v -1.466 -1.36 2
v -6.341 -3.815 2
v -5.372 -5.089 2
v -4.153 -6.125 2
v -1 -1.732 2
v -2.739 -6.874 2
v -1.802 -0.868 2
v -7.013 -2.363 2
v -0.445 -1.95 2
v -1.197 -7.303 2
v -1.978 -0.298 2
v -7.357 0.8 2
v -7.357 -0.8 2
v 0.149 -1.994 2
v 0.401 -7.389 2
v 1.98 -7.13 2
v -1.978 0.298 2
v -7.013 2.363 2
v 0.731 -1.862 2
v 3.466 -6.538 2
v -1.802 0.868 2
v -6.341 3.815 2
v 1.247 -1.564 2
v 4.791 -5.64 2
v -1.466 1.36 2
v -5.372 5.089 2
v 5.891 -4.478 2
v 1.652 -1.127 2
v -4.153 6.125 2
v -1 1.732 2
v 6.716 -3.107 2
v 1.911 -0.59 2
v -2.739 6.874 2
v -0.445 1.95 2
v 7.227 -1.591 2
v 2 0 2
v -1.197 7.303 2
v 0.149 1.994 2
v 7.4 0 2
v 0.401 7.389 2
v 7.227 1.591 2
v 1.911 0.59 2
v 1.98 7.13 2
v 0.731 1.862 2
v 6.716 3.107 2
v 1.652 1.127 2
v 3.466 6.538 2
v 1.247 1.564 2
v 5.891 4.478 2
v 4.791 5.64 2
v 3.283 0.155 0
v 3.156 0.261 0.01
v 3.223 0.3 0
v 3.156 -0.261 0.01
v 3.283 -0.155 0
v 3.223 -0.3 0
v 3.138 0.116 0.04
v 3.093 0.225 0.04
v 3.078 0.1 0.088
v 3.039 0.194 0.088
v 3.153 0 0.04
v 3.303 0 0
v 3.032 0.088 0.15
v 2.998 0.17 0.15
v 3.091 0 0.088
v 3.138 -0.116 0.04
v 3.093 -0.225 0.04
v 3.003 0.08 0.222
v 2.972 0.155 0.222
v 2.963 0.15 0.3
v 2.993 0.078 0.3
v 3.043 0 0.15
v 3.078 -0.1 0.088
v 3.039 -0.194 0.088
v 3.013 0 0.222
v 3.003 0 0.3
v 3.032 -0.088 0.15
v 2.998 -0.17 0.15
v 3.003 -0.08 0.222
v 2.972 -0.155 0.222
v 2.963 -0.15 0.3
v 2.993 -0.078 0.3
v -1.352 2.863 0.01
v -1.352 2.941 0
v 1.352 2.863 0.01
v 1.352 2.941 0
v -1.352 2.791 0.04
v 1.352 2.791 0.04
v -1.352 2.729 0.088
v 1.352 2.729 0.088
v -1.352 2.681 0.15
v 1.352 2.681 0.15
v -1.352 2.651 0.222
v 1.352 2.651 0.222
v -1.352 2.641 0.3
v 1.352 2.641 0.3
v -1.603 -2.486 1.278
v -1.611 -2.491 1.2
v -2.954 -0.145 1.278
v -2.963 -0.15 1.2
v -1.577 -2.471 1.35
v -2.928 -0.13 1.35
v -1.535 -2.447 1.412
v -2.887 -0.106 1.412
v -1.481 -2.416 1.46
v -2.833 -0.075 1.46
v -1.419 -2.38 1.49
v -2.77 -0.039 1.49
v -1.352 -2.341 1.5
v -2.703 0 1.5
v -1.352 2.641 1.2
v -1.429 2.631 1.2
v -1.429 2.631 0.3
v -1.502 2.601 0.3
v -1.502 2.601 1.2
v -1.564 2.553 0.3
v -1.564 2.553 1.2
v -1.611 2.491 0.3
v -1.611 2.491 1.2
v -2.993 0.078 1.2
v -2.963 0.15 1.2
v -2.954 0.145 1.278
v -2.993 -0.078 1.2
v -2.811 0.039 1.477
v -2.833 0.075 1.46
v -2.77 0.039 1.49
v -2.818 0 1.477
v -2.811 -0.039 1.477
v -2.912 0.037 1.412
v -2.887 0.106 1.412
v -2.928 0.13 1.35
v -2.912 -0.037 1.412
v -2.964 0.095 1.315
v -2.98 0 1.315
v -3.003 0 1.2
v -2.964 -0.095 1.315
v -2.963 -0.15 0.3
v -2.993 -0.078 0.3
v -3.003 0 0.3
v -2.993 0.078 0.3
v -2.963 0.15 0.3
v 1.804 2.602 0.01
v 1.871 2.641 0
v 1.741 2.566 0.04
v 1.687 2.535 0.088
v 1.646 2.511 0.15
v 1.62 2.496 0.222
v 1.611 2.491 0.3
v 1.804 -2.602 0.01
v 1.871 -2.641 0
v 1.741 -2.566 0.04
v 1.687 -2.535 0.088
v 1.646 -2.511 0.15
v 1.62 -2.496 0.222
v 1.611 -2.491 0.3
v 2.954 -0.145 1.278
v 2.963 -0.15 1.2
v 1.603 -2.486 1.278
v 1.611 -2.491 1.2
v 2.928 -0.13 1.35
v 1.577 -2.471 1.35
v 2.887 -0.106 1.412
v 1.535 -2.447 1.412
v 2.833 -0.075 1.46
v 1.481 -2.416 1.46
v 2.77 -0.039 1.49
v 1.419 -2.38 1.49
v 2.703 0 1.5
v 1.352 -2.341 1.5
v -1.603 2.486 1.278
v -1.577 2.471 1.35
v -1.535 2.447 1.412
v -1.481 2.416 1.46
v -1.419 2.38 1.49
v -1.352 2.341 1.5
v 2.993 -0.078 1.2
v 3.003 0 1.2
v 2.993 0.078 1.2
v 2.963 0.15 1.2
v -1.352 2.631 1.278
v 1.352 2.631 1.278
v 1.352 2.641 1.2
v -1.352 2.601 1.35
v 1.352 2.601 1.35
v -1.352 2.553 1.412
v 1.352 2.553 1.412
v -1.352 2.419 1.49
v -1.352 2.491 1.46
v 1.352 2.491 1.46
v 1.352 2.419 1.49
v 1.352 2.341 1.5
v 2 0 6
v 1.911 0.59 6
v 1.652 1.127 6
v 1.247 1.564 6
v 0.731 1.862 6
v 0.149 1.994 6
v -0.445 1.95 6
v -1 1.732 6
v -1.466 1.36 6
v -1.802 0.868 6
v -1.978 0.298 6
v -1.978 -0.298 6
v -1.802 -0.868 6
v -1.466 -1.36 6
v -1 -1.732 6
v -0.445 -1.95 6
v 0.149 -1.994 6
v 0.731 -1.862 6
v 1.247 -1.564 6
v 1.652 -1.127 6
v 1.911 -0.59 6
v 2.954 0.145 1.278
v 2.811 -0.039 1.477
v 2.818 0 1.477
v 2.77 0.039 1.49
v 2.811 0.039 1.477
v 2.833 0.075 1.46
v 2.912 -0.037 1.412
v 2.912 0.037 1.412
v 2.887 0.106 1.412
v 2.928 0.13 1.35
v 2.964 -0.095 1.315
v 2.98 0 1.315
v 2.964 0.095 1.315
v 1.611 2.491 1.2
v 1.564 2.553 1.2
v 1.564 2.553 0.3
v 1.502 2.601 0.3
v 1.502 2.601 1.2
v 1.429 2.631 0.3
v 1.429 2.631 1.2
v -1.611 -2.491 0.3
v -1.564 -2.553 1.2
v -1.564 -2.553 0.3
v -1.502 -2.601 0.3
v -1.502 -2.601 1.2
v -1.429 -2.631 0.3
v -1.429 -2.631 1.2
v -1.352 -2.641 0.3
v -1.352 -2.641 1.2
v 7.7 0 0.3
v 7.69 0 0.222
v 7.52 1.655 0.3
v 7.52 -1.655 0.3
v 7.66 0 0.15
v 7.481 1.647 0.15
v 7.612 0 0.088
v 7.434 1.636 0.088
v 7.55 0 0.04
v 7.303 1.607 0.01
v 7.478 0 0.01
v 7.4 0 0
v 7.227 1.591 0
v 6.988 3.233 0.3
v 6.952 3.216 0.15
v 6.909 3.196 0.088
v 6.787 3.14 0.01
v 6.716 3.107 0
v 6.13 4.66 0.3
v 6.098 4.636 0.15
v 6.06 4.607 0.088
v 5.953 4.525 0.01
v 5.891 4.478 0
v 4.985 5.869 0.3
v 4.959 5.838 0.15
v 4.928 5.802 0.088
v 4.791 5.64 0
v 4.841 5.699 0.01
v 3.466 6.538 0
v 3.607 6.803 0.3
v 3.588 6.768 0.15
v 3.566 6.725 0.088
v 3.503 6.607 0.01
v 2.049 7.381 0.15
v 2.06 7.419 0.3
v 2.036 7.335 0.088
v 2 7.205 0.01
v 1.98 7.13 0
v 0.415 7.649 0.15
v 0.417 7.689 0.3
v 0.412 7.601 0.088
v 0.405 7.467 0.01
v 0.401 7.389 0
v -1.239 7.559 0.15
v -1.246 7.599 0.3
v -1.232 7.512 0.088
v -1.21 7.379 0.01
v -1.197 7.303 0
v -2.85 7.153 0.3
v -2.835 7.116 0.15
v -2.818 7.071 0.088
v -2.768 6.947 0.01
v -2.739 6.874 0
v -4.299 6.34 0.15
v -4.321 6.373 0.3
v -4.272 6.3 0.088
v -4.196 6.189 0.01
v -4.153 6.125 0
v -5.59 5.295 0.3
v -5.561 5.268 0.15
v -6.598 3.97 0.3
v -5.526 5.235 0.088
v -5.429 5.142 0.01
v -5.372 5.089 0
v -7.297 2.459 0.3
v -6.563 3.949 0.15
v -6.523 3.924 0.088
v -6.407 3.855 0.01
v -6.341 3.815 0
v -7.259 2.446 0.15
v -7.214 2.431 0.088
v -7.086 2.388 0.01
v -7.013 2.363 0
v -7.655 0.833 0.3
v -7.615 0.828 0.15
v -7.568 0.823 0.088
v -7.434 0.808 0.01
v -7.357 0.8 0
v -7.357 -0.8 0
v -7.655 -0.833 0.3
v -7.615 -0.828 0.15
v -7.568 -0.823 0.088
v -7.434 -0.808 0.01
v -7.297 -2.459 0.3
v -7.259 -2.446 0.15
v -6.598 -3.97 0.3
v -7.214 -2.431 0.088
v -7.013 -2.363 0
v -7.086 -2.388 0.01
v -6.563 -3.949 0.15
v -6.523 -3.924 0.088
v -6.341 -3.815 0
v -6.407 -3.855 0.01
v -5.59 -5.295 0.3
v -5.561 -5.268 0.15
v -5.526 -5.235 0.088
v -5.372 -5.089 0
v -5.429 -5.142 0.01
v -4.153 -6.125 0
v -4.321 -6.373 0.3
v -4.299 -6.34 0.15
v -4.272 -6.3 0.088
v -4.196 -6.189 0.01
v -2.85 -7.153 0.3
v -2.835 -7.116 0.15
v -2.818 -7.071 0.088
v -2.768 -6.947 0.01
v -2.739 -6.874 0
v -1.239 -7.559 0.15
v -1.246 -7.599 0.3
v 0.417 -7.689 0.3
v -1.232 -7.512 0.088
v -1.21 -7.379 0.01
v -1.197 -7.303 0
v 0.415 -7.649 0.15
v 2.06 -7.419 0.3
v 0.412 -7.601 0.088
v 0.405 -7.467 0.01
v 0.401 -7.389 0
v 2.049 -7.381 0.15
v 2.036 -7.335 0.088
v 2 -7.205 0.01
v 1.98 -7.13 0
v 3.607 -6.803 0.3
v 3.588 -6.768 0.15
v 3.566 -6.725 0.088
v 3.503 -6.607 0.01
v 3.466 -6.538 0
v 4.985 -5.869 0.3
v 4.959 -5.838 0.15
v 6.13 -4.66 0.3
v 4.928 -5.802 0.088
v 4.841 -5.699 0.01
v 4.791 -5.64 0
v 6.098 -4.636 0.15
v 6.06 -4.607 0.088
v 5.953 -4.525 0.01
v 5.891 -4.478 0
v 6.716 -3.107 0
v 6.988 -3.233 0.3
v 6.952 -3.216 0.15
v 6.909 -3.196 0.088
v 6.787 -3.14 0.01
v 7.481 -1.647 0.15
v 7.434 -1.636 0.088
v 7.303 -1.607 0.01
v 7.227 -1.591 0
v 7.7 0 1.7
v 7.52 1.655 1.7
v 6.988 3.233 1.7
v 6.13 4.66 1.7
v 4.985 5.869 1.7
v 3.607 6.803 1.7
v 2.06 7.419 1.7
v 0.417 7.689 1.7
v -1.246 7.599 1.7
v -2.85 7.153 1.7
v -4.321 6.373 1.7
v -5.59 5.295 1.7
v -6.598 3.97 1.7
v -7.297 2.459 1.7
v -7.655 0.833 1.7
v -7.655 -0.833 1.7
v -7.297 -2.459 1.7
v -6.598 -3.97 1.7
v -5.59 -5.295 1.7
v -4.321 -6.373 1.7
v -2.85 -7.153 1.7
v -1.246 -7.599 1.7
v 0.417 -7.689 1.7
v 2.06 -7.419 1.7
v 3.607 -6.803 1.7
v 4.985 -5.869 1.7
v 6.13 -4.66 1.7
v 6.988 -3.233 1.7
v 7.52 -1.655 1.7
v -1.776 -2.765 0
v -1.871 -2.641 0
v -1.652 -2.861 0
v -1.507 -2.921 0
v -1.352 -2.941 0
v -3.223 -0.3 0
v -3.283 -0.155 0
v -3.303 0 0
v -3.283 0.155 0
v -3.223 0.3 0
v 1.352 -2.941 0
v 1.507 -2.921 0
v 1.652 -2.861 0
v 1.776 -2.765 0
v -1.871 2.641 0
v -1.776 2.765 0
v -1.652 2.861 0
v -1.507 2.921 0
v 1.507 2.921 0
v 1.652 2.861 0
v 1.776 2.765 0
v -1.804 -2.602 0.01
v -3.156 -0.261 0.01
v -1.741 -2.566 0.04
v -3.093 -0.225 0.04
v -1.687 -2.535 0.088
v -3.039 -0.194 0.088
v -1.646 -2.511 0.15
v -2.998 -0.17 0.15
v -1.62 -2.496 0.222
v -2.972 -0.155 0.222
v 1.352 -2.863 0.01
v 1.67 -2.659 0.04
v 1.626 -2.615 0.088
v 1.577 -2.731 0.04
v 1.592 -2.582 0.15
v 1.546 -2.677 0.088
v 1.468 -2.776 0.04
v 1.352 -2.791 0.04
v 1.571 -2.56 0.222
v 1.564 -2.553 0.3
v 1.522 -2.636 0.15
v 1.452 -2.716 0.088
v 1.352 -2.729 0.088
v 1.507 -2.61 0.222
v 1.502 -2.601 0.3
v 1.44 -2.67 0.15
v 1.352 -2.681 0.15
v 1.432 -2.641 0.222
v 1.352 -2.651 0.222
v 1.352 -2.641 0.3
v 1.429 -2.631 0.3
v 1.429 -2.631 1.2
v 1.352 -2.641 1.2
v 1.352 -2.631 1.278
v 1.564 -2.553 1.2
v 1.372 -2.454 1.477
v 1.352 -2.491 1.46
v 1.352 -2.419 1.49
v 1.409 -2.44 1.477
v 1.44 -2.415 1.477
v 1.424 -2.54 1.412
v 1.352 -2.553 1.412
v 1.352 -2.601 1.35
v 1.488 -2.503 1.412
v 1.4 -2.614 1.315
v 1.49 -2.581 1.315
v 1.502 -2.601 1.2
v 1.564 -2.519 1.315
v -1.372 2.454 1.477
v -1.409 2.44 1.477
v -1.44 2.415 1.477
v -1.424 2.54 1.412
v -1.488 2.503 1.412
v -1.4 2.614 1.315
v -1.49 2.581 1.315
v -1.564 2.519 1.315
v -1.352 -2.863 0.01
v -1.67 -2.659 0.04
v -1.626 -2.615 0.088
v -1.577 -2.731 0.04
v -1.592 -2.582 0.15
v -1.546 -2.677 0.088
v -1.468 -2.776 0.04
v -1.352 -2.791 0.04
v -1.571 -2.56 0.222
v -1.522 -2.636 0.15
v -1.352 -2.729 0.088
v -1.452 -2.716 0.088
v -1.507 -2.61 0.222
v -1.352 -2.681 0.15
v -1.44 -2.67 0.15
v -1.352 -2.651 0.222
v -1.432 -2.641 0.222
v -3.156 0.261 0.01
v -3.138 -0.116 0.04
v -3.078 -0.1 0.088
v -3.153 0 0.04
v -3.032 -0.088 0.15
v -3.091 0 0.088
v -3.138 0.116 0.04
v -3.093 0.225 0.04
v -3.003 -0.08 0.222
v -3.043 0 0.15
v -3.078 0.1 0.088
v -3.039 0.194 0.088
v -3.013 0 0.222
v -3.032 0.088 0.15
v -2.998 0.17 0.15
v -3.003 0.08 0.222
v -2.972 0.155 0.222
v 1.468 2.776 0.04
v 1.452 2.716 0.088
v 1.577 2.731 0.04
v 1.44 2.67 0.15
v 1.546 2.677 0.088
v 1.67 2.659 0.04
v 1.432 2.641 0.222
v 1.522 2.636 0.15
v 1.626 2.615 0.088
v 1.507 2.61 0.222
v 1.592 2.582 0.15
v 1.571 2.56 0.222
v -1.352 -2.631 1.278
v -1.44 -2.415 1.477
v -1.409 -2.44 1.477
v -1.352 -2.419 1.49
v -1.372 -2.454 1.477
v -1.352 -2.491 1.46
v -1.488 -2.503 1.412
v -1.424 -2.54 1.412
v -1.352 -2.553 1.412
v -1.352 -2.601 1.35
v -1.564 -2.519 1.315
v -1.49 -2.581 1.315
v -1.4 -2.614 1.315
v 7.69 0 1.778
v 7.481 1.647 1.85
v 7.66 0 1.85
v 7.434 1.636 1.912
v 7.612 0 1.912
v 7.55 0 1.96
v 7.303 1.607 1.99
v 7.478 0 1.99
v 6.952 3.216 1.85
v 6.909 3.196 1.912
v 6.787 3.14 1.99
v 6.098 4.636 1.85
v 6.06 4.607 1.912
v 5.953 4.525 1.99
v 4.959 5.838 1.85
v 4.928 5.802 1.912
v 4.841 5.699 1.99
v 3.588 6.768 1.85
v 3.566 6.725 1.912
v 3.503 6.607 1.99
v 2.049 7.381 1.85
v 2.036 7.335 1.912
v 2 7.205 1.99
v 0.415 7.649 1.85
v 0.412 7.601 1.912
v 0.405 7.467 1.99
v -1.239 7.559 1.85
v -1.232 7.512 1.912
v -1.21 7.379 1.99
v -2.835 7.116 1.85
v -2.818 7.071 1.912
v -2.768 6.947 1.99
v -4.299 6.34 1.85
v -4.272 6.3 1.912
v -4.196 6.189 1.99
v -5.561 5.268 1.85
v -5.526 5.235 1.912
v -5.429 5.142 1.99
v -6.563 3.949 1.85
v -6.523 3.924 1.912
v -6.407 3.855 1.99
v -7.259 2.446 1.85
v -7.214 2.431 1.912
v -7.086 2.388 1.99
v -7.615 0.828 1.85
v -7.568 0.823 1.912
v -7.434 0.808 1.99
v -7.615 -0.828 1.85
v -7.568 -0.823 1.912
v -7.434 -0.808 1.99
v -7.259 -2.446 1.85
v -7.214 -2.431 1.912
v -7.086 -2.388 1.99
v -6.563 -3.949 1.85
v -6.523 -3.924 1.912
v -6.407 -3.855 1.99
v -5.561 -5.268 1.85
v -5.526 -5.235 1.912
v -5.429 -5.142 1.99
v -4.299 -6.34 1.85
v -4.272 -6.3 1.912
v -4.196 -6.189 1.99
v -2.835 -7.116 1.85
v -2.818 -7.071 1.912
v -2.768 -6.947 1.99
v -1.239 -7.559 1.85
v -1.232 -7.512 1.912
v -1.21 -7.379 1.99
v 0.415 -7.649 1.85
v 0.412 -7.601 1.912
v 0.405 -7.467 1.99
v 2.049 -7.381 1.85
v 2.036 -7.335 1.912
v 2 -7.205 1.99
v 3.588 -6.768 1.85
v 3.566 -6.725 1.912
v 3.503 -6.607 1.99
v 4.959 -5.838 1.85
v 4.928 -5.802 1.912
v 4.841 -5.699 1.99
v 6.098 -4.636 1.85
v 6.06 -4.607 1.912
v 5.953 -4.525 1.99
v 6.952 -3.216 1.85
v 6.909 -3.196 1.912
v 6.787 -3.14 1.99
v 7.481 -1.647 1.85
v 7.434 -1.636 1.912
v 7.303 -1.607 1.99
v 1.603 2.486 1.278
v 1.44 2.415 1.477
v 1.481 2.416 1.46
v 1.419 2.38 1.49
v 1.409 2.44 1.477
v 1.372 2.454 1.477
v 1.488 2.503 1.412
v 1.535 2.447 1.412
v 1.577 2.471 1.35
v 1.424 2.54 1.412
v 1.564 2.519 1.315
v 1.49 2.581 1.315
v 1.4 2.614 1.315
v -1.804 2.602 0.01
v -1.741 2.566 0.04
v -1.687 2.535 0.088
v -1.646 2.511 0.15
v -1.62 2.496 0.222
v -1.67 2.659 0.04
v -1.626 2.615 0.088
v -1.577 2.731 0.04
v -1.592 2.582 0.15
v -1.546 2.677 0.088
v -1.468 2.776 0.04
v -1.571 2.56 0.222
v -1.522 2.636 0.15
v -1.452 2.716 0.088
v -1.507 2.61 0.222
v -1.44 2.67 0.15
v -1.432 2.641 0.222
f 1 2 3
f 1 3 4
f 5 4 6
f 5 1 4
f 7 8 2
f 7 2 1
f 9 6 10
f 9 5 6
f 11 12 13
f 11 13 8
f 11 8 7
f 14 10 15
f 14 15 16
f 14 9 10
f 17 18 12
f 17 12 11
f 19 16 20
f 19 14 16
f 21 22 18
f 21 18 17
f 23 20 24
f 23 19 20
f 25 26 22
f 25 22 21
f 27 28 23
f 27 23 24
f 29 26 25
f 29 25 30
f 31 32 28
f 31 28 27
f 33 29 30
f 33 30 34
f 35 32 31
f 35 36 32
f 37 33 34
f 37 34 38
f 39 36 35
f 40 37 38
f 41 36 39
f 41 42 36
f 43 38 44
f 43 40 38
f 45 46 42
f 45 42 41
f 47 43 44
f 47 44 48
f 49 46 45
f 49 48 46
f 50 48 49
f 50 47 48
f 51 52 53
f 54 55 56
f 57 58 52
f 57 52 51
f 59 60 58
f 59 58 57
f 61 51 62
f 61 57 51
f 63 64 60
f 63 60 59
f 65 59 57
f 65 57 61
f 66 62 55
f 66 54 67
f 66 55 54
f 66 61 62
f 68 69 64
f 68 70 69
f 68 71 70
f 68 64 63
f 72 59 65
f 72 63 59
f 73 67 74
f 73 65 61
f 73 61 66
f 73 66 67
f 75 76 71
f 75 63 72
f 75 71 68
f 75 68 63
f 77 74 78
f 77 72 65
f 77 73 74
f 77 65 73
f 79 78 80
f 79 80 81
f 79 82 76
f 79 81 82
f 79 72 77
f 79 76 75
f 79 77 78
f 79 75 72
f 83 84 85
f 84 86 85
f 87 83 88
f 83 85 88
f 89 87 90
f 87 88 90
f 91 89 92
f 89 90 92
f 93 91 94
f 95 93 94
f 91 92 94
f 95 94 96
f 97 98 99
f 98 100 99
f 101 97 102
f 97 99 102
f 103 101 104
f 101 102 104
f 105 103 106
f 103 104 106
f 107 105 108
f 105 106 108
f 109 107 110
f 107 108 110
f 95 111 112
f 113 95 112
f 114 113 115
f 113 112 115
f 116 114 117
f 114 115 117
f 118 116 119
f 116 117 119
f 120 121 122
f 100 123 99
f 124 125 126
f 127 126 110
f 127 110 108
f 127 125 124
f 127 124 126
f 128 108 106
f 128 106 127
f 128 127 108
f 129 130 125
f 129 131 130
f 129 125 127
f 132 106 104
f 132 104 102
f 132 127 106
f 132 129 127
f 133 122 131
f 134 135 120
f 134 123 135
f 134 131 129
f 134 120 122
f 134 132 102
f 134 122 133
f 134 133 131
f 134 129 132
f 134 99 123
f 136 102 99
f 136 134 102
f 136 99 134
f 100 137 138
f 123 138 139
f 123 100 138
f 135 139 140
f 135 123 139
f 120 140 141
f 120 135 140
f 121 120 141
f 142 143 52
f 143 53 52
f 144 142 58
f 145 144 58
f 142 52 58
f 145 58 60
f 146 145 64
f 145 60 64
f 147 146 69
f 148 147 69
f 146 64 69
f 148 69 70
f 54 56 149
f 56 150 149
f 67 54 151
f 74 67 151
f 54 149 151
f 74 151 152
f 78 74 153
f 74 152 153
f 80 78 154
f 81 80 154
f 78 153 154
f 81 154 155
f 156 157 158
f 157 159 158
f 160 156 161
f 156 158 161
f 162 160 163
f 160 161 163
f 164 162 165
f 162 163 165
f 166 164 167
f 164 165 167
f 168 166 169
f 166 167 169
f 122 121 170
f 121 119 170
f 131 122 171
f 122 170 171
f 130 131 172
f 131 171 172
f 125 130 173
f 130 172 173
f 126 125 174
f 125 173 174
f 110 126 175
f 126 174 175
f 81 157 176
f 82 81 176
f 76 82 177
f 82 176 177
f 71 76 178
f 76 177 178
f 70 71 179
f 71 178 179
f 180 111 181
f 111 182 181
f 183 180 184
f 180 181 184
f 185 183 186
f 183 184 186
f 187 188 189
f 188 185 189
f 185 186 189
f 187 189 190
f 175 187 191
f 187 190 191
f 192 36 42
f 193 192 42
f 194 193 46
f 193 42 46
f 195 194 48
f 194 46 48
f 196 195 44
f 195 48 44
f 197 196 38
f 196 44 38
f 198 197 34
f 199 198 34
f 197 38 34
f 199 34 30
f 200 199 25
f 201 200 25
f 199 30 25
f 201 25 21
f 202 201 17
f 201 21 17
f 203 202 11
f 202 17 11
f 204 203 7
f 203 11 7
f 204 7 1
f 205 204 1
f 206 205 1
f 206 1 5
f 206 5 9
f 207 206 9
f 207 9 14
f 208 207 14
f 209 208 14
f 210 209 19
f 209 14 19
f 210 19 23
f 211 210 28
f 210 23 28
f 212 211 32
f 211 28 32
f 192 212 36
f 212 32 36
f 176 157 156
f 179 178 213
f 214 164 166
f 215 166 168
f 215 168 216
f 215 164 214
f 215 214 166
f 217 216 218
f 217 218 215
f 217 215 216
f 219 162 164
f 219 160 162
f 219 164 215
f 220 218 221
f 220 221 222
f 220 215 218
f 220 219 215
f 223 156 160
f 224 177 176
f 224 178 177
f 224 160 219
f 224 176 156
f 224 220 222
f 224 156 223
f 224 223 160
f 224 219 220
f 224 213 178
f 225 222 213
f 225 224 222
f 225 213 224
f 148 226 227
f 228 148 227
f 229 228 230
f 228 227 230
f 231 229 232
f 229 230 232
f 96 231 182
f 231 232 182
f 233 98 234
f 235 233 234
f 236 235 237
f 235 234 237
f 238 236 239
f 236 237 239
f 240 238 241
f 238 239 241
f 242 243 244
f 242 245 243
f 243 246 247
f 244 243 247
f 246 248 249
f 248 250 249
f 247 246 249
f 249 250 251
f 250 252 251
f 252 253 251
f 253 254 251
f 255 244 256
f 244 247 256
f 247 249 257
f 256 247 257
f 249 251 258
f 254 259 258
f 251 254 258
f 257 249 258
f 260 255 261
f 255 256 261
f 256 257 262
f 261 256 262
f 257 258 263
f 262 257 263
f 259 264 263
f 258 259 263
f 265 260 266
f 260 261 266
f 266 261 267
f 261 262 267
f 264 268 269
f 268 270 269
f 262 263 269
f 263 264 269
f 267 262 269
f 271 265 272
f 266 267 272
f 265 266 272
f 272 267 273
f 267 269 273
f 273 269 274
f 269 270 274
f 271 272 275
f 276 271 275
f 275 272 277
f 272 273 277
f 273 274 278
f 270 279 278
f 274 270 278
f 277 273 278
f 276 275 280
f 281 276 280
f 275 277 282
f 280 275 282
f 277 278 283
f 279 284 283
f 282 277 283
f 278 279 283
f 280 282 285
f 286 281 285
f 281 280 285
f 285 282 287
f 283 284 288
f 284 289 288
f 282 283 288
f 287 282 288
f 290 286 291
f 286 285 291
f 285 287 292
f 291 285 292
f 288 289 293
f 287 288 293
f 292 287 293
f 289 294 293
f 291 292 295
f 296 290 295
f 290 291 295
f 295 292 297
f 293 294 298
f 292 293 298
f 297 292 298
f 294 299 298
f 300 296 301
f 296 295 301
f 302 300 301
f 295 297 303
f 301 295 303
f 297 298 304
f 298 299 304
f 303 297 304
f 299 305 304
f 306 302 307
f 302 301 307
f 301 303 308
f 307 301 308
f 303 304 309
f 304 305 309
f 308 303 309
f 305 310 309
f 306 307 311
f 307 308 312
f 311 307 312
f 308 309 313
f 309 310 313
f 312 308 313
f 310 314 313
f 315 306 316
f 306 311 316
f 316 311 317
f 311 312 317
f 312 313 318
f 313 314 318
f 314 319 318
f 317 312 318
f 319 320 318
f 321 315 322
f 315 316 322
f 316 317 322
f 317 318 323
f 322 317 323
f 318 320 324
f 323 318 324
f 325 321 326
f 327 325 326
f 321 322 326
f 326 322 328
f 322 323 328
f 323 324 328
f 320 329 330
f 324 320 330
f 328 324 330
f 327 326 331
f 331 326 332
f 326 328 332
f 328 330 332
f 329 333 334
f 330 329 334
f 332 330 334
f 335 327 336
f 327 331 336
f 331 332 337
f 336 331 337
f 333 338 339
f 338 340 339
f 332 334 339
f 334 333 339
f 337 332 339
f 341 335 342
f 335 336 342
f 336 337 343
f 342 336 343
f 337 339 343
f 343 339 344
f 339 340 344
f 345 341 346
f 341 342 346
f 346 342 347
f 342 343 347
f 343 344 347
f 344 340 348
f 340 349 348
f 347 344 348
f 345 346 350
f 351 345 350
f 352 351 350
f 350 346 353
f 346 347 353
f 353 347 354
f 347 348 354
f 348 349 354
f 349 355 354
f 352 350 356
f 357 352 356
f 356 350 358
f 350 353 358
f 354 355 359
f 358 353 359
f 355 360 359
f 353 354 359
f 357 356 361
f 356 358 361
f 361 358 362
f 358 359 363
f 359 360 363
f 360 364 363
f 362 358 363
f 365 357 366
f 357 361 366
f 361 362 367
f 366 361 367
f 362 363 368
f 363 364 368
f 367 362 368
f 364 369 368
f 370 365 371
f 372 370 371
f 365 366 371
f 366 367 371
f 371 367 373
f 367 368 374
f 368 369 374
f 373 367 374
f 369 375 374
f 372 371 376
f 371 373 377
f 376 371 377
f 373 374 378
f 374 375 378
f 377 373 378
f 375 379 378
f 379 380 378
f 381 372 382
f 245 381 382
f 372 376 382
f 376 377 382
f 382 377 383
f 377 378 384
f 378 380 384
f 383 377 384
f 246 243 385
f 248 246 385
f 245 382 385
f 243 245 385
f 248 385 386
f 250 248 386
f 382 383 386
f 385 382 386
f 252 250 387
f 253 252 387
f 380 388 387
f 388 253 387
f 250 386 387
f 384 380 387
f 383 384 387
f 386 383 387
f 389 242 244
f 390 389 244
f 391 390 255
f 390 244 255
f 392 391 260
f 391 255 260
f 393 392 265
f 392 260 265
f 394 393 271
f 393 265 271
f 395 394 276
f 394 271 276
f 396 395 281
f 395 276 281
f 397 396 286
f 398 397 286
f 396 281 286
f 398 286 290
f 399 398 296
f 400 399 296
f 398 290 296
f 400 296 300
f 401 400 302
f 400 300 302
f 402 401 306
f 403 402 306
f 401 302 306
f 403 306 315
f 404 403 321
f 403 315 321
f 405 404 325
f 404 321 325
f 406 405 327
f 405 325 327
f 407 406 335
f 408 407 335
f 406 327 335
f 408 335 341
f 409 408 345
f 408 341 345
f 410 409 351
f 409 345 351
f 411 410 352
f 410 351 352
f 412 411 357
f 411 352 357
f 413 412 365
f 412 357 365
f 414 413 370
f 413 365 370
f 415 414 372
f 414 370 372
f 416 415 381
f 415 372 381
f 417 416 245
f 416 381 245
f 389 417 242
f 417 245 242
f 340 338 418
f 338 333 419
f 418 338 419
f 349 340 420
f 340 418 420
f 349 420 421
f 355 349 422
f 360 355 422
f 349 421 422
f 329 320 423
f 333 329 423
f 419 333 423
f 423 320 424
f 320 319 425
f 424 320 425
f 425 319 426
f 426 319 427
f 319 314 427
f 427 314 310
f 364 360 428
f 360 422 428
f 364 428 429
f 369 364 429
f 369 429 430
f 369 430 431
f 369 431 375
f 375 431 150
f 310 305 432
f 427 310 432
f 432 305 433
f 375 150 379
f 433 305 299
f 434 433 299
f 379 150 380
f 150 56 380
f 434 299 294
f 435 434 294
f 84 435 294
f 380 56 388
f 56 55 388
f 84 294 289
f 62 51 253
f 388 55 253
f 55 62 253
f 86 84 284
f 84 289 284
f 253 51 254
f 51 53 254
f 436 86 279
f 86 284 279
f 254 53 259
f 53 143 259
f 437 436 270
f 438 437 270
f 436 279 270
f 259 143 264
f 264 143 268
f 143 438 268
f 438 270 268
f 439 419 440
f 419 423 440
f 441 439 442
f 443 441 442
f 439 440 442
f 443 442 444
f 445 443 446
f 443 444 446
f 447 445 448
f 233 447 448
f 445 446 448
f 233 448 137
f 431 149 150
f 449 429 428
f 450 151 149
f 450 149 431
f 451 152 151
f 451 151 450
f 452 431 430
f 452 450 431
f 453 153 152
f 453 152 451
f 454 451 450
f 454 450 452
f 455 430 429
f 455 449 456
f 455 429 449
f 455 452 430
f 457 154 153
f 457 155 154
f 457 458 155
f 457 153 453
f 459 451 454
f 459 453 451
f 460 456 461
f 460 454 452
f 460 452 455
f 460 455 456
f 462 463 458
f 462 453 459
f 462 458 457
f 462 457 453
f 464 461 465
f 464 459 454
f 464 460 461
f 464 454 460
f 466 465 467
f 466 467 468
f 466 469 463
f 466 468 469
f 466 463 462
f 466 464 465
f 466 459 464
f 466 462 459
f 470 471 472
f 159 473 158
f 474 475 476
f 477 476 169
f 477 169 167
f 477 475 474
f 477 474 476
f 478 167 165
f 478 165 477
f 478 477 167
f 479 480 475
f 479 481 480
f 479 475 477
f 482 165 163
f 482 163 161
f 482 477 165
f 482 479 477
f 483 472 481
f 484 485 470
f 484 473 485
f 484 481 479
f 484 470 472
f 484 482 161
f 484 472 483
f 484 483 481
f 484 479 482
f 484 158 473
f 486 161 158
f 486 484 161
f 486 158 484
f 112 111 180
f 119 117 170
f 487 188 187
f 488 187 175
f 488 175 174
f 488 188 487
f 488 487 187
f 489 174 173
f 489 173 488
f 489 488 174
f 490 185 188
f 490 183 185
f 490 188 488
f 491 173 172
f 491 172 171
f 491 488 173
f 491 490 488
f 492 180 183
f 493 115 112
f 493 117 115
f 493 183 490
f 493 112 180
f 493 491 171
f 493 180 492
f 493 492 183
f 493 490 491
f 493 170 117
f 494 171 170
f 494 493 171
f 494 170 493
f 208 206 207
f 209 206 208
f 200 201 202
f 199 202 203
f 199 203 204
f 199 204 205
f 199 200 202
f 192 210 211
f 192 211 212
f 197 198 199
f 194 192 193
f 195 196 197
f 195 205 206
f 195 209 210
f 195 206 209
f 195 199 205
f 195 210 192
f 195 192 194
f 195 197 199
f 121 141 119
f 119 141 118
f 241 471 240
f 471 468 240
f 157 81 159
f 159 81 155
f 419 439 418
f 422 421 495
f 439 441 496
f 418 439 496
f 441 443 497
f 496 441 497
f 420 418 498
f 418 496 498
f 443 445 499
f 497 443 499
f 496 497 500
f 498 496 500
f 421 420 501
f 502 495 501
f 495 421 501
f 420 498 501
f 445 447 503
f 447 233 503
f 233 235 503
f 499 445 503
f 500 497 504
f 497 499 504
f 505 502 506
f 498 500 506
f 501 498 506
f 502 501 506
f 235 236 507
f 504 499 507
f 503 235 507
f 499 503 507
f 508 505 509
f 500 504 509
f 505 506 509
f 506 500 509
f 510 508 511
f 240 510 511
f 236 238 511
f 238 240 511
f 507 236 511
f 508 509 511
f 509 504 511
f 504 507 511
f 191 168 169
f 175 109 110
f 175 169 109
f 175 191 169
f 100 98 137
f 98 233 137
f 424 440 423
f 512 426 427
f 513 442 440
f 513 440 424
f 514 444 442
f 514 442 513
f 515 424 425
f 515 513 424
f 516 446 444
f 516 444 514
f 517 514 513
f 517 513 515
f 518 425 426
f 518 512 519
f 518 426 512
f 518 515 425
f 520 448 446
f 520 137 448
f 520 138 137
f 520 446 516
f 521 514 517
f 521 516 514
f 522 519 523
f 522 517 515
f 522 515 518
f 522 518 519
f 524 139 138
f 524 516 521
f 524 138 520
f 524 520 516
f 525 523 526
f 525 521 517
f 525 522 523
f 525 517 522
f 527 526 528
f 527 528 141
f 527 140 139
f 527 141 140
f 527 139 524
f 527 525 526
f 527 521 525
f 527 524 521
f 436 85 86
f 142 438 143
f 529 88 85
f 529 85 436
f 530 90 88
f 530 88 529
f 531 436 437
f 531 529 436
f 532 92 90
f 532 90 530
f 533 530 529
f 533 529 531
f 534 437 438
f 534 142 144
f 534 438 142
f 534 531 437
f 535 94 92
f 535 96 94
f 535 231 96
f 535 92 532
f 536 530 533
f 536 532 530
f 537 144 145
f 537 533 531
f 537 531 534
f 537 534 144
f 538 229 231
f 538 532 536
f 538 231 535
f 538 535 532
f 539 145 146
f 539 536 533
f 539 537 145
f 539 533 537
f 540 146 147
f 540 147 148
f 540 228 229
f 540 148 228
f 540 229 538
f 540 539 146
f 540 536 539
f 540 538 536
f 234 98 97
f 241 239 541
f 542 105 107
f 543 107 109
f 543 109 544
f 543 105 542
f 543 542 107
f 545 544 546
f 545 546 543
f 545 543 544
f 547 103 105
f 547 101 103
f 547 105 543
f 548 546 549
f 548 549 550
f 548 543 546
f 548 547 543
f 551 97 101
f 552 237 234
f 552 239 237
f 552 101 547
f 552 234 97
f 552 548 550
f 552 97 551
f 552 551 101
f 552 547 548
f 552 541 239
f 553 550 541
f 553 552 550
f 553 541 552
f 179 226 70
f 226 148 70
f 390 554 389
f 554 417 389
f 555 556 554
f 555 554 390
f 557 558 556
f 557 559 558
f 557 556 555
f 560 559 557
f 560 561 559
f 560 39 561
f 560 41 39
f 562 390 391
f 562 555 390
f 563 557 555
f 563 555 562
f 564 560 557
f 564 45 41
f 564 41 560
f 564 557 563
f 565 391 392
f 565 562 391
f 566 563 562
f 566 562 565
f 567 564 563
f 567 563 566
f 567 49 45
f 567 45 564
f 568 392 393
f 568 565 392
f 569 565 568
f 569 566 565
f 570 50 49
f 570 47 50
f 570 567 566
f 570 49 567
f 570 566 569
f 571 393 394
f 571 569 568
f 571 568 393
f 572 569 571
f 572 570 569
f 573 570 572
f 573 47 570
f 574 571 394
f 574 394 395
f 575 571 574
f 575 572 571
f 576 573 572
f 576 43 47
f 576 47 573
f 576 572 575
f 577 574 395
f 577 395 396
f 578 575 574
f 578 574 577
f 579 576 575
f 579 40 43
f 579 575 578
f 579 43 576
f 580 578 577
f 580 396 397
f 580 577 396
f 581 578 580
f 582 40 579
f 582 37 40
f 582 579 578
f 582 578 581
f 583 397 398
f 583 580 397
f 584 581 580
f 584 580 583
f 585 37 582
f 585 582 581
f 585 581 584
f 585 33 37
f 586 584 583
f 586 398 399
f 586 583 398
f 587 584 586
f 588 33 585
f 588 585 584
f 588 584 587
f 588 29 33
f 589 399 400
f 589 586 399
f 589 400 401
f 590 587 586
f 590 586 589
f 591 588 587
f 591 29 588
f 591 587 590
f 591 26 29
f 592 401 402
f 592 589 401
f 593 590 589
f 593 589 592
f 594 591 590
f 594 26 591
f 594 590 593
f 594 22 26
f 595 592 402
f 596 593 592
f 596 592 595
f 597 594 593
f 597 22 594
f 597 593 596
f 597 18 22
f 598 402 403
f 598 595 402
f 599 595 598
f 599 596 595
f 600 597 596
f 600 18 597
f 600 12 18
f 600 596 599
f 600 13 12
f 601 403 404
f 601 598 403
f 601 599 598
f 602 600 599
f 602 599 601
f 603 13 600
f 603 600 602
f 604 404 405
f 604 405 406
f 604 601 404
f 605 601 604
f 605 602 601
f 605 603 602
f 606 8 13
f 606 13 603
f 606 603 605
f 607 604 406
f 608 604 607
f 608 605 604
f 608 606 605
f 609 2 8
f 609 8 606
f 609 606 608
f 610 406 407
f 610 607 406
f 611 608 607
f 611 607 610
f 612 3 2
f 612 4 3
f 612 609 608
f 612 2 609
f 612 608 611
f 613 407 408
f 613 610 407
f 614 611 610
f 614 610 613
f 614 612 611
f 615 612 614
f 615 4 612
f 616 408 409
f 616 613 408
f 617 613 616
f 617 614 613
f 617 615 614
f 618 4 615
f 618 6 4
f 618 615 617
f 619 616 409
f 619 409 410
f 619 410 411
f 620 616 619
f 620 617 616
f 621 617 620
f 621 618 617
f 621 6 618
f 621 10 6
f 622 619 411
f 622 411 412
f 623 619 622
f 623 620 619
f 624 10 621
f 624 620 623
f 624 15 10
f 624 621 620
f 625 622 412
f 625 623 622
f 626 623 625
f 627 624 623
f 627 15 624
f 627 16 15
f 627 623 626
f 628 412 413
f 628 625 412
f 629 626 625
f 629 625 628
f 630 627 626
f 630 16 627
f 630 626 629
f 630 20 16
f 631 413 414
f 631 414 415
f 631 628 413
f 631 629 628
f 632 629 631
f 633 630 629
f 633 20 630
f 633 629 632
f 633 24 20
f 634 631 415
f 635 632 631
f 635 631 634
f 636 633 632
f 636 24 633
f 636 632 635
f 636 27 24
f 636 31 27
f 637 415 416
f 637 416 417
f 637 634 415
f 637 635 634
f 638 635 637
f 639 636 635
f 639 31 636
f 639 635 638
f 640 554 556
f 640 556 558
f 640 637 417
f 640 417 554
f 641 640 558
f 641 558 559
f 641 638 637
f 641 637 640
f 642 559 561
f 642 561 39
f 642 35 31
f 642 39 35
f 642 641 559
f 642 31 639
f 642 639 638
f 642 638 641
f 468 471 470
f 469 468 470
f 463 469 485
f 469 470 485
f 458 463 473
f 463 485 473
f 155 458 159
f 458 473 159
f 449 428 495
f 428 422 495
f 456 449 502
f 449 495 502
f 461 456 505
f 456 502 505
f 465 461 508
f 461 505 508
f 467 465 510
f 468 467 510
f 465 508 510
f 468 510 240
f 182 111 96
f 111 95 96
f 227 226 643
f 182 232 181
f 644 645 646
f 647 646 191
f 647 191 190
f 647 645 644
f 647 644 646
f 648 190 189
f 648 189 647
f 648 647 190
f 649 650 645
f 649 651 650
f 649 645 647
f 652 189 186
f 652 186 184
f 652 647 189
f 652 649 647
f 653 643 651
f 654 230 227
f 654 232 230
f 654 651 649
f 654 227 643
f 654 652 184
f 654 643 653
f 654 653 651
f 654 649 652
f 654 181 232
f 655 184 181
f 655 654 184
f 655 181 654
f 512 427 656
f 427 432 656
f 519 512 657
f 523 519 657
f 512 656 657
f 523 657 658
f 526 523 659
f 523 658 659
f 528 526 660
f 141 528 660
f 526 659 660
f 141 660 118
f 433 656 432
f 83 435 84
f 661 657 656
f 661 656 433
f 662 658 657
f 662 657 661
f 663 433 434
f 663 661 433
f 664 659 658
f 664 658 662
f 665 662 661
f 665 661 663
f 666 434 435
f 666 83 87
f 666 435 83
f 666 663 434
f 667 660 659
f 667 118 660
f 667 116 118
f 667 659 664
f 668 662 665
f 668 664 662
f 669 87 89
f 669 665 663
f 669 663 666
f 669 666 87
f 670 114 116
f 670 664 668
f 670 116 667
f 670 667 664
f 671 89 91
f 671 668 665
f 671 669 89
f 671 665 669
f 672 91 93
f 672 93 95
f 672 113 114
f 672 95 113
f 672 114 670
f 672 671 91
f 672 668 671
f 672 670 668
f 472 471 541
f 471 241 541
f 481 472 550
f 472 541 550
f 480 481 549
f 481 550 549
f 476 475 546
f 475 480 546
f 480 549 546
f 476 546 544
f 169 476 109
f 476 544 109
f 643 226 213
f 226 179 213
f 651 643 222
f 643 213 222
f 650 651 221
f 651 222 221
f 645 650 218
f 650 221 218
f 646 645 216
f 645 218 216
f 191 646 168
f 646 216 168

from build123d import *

# Parameters (mm, degrees)
SKETCH1_R      = 7.7
EXTRUDE1_DEPTH = 2
FILLET1_R      = 0.3
EXTRUDE2_DEPTH = 1.5
FILLET2_R      = 0.3
SKETCH3_R      = 2
EXTRUDE4_DEPTH = 4


with BuildPart() as part:
    # Sketch1 → Extrude1 (new body)
    with BuildSketch(Plane.XY):
        Circle(SKETCH1_R)
    extrude(amount=EXTRUDE1_DEPTH)

    # Fillet1
    fillet1_edges = [part.edges().sort_by_distance(p)[0] for p in [
        (-7.7, 0, 0),
        (-7.7, 0, 2),
    ]]
    fillet(fillet1_edges, radius=FILLET1_R)

    # Sketch2 → Extrude2 (cut)
    with BuildSketch(Plane(origin=(0, 0, 0), x_dir=(-1, 0, 0), z_dir=(0, 0, -1))):
        Polygon((3.049554036, 0), (1.524777018, 2.640991265), (-1.524777018, 2.640991265), (-3.049554036, 0), (-1.524777018, -2.640991265), (1.524777018, -2.640991265), align=None)
    extrude(amount=-EXTRUDE2_DEPTH, mode=Mode.SUBTRACT)

    # Fillet2
    fillet2_edges = [part.edges().sort_by_distance(p)[0] for p in [
        (-2.287165527, -1.320495633, 1.5),
        (-3.049554036, 0, 0.75),
        (0, -2.640991265, 1.5),
        (-1.524777018, -2.640991265, 0.75),
        (2.287165527, -1.320495633, 1.5),
        (1.524777018, -2.640991265, 0.75),
        (2.287165527, 1.320495633, 1.5),
        (3.049554036, 0, 0.75),
        (0, 2.640991265, 1.5),
        (1.524777018, 2.640991265, 0.75),
        (-2.287165527, 1.320495633, 1.5),
        (-1.524777018, 2.640991265, 0.75),
        (-2.287165527, -1.320495633, 0),
        (-2.287165527, 1.320495633, 0),
        (0, 2.640991265, 0),
        (2.287165527, 1.320495633, 0),
        (2.287165527, -1.320495633, 0),
        (0, -2.640991265, 0),
    ]]
    fillet(fillet2_edges, radius=FILLET2_R)

    # Sketch3 → Extrude4 (add)
    with BuildSketch(Plane.XY.offset(2)):
        Circle(SKETCH3_R)
    extrude(amount=EXTRUDE4_DEPTH)


solid = part.part
